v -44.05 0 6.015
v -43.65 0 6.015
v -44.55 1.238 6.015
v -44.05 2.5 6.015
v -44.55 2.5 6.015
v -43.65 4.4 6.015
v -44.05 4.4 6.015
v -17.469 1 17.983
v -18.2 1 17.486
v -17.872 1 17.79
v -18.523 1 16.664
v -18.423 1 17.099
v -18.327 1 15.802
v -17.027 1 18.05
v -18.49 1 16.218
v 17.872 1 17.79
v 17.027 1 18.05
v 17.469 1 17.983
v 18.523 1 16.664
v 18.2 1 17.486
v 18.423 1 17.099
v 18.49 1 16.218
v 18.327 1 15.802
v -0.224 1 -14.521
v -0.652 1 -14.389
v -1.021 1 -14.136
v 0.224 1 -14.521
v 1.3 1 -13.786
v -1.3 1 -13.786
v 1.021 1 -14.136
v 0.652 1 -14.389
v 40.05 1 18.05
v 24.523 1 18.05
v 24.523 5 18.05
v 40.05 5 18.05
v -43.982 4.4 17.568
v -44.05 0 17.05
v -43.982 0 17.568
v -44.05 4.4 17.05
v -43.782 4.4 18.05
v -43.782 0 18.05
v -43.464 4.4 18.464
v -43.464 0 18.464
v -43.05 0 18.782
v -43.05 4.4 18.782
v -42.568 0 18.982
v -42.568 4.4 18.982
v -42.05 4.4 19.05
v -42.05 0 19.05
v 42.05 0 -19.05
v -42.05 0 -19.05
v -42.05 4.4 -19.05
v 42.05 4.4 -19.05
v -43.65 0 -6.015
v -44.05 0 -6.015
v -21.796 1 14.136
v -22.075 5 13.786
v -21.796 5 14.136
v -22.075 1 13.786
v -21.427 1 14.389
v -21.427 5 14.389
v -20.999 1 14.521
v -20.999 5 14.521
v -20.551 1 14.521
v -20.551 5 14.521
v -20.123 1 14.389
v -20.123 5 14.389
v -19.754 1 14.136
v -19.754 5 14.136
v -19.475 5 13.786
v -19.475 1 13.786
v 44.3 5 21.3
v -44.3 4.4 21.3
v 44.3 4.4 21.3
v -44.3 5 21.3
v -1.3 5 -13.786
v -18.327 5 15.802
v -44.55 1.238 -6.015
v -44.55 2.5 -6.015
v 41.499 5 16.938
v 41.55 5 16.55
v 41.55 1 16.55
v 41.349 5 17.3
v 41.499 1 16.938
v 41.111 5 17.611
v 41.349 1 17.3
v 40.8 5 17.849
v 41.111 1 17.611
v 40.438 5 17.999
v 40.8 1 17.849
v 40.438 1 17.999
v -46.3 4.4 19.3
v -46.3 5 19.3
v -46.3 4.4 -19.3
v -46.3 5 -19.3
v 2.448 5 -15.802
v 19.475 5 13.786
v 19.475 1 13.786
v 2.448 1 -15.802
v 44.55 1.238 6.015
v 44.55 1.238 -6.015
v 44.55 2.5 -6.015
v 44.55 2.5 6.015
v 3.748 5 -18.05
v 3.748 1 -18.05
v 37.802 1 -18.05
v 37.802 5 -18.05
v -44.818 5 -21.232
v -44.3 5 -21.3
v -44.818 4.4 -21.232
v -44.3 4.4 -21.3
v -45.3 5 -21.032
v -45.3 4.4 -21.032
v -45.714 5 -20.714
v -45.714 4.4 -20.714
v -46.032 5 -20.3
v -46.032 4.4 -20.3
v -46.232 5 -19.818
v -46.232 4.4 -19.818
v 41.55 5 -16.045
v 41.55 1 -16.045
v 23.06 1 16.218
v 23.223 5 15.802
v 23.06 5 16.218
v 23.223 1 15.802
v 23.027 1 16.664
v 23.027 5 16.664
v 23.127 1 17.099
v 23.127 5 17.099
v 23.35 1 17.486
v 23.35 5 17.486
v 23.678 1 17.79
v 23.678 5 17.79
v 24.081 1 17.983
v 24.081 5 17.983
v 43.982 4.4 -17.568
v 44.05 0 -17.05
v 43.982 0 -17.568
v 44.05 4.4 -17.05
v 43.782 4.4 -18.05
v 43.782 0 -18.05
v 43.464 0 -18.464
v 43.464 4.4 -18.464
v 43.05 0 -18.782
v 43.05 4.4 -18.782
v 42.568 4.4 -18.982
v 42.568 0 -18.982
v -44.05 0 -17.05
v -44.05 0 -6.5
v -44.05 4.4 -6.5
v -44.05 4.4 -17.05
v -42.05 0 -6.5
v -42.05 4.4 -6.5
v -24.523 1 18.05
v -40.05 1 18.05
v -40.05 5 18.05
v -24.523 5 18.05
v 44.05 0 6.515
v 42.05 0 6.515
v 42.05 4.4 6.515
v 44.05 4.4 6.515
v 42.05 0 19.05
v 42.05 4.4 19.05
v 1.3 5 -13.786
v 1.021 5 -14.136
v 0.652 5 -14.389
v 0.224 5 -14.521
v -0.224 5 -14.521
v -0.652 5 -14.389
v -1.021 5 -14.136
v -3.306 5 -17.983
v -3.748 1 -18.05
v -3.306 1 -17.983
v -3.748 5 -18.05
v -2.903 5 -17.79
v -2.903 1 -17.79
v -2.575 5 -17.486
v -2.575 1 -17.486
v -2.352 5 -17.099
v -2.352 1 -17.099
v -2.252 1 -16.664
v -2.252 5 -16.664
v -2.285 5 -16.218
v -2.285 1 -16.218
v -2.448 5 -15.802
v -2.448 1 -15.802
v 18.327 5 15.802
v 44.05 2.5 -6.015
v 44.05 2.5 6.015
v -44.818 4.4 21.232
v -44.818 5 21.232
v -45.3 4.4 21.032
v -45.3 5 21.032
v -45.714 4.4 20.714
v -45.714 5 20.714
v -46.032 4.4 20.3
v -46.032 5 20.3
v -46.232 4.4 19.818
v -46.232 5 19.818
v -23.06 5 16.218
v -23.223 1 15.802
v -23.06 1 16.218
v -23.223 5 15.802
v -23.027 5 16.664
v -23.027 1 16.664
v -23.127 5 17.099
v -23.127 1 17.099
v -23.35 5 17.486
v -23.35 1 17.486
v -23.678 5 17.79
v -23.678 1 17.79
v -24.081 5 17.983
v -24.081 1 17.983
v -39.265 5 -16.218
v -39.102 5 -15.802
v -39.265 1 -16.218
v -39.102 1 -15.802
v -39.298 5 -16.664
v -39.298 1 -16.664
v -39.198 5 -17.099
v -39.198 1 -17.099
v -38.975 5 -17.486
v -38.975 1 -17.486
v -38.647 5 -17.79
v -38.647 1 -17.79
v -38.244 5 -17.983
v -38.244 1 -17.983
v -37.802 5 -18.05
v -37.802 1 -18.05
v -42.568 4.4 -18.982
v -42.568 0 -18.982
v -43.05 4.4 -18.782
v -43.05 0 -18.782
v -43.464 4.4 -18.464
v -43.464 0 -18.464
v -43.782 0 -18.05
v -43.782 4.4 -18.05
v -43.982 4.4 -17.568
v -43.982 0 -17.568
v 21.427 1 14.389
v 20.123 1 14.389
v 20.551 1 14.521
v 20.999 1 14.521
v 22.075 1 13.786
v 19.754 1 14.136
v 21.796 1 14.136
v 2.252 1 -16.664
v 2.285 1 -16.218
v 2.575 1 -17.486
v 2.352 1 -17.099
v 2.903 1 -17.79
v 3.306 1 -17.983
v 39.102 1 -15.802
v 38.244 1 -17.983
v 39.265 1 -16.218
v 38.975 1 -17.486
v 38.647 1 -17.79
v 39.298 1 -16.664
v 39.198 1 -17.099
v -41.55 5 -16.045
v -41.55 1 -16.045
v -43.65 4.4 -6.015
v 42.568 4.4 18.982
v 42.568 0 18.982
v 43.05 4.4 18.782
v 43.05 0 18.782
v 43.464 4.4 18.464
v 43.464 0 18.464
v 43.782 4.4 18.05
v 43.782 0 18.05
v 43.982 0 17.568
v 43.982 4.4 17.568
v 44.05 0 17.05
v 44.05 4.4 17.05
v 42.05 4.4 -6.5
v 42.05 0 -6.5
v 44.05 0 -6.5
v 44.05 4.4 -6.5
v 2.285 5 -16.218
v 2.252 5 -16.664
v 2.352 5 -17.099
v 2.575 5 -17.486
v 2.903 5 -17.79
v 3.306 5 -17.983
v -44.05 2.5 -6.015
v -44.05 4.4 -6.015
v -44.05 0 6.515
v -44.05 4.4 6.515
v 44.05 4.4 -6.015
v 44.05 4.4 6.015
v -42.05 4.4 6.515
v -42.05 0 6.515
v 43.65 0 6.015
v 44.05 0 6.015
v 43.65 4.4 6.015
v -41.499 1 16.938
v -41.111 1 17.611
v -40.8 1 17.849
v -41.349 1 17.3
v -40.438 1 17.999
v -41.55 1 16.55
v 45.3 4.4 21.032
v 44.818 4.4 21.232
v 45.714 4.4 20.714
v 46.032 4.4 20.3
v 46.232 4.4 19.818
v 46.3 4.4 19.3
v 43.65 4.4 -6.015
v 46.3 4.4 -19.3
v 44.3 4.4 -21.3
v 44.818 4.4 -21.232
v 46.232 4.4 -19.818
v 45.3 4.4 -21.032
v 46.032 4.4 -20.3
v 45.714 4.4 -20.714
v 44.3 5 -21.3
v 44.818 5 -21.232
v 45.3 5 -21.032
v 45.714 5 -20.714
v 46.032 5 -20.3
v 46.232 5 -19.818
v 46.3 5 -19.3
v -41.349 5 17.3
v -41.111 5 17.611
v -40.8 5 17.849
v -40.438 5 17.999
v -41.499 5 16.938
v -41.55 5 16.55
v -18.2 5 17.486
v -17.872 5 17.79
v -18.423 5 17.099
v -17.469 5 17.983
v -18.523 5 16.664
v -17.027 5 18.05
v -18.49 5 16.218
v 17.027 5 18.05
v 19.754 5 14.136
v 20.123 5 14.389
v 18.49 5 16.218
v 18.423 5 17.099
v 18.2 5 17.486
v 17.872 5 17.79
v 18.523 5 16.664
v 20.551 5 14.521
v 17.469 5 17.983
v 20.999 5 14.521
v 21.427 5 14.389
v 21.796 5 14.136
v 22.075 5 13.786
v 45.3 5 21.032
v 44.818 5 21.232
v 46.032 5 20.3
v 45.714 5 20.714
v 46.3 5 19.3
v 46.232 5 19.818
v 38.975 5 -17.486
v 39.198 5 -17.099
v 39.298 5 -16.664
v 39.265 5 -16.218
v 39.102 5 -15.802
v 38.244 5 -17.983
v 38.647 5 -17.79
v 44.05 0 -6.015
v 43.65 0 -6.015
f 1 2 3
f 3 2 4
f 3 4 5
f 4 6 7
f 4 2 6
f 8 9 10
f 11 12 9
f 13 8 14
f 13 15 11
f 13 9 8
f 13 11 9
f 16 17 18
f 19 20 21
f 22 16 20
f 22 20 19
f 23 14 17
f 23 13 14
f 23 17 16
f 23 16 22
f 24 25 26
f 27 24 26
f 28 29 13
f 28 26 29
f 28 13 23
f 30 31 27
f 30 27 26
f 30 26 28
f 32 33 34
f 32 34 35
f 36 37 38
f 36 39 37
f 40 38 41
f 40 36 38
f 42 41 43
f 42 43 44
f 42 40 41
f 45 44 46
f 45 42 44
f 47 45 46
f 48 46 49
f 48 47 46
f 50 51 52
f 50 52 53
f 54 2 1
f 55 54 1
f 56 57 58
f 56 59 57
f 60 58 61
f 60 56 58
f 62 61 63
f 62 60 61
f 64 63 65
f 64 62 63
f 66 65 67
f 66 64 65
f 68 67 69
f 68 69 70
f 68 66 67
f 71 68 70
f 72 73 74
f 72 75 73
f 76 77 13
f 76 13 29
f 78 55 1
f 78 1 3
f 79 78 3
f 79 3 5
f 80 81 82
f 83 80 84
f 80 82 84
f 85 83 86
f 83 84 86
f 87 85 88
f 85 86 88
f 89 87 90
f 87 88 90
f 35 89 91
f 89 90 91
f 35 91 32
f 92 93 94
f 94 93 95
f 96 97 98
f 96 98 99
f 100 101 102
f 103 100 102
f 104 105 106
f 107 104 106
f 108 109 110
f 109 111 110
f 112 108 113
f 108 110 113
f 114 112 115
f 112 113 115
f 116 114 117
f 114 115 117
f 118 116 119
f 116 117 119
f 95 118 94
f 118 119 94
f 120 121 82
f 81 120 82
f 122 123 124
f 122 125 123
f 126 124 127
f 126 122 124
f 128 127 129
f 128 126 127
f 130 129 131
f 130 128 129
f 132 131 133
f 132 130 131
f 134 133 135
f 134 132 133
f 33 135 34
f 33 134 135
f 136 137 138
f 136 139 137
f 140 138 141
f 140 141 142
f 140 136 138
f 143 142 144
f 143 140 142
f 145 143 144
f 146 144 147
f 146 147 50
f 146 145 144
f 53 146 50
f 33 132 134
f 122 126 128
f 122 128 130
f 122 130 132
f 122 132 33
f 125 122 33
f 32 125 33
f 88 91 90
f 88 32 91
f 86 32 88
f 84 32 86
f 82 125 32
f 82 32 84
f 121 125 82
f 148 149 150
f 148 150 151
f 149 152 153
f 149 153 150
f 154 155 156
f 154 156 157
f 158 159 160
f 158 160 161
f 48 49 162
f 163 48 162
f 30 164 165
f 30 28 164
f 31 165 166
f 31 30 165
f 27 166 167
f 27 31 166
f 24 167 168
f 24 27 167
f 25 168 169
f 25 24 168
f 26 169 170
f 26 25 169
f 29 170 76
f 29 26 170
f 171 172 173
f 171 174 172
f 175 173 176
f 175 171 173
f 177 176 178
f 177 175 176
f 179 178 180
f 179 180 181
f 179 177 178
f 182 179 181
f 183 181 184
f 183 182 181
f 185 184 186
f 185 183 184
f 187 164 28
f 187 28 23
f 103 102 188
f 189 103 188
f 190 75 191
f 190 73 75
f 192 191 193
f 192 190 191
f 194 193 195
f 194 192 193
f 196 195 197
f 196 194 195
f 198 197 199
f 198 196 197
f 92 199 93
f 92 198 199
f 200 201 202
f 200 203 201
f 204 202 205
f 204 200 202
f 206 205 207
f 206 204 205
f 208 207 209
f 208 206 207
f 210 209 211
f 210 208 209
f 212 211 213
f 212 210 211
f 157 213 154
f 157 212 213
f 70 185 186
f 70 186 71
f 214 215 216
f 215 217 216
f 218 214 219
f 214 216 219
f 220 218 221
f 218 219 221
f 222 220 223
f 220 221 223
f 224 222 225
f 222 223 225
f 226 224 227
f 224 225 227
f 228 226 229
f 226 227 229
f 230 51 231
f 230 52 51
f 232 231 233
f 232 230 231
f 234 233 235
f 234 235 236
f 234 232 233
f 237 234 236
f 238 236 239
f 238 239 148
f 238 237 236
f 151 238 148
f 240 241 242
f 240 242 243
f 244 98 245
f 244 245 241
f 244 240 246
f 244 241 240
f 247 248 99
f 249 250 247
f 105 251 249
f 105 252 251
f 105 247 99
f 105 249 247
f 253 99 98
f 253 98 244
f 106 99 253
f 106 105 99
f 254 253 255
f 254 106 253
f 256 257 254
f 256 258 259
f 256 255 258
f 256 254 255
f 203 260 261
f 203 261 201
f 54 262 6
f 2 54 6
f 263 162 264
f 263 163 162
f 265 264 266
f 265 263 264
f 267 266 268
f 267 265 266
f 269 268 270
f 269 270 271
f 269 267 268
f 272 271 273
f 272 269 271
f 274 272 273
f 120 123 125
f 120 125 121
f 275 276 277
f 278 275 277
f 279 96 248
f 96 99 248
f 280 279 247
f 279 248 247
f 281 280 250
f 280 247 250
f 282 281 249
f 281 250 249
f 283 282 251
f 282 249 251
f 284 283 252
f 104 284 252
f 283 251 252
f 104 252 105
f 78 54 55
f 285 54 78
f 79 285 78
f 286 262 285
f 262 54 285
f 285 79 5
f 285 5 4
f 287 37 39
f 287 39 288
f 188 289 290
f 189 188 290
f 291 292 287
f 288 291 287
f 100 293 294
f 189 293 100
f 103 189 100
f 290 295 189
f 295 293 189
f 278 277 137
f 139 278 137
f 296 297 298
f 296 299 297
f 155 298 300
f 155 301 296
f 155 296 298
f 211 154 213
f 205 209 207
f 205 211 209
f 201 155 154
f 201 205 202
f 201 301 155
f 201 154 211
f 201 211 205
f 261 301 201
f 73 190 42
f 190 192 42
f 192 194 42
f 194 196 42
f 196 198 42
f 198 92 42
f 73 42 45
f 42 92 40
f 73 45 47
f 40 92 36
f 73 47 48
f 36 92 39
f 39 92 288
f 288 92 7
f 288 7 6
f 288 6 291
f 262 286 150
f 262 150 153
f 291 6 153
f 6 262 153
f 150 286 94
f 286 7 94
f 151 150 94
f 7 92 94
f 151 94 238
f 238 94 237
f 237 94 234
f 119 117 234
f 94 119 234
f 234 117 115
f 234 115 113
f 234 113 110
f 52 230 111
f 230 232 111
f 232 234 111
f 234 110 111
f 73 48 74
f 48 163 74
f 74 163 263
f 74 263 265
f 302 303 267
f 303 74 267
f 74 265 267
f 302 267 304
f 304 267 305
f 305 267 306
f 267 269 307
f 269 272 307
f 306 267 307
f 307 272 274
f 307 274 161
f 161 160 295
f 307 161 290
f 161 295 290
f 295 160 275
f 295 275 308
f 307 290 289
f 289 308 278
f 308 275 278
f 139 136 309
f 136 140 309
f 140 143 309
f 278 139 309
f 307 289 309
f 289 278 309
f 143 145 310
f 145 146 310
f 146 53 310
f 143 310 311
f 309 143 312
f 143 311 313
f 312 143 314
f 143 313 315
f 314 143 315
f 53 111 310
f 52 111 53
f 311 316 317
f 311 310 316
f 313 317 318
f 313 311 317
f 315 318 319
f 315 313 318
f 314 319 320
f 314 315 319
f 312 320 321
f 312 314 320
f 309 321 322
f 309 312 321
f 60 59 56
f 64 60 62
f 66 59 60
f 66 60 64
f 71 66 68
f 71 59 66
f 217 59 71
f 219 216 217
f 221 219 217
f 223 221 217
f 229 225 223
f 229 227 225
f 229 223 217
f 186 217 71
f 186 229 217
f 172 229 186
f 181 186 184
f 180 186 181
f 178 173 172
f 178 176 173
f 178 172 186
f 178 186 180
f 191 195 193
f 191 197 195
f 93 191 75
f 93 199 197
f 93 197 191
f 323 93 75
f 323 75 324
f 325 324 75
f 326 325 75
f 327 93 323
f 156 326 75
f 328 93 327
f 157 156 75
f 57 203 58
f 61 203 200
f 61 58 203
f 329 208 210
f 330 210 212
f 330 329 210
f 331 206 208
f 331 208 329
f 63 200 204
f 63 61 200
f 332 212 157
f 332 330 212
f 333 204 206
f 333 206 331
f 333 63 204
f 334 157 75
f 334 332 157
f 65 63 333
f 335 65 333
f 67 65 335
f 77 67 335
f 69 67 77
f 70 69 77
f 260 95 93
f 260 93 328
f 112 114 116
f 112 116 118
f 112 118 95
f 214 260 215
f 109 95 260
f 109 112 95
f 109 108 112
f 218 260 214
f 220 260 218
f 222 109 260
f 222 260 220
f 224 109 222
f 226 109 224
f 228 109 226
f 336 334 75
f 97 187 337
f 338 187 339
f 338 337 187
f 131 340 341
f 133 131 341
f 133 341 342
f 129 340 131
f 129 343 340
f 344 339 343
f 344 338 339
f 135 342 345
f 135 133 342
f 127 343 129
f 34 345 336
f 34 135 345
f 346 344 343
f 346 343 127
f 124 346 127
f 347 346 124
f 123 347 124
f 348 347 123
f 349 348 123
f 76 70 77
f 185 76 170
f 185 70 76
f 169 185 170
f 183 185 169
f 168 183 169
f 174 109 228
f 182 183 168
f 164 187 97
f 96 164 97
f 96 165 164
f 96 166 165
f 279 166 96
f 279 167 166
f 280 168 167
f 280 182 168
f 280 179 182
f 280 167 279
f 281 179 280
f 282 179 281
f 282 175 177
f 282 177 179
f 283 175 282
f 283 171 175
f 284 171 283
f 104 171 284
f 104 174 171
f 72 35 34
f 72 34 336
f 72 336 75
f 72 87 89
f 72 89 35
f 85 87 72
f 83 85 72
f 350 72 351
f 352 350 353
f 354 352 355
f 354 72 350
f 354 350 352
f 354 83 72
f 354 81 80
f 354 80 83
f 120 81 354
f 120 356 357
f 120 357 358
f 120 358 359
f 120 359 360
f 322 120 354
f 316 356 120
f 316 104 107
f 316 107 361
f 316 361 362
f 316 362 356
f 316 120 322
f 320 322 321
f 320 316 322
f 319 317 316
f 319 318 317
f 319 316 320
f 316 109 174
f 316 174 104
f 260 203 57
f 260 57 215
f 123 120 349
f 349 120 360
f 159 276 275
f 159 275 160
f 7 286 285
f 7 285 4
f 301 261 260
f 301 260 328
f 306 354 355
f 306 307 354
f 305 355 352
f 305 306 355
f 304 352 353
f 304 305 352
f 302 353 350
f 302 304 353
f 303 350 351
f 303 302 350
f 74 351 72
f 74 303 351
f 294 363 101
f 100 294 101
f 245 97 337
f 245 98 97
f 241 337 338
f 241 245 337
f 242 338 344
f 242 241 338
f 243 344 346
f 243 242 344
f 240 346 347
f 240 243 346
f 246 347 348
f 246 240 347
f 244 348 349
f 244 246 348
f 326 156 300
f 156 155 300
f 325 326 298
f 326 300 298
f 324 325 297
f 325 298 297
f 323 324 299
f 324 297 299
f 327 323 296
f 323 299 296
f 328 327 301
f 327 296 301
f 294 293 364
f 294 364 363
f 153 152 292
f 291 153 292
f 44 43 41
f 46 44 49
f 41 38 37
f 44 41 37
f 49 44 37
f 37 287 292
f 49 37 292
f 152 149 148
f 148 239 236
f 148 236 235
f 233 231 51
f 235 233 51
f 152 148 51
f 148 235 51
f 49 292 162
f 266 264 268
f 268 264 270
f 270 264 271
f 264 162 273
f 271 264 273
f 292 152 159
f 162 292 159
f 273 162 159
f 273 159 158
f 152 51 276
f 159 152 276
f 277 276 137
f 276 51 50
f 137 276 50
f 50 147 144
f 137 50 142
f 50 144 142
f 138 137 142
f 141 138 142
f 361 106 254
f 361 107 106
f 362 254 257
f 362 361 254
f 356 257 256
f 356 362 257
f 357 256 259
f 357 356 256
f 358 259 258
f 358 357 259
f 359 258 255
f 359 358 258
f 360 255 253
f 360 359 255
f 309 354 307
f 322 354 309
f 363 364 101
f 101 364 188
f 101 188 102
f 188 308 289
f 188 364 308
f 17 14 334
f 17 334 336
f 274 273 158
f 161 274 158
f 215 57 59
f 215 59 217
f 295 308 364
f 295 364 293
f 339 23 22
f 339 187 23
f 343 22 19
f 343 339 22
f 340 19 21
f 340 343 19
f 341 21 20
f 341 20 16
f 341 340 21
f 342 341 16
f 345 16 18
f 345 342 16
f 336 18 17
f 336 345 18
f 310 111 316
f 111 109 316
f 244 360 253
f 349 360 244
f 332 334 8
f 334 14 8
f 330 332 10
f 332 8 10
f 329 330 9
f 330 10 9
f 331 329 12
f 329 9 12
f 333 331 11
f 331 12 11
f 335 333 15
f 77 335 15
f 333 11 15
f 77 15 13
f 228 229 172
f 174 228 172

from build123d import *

# Parameters (mm, degrees)
SKETCH1_W           = 88.1
SKETCH1_H           = 38.1
BOSS_EXTRUDE1_DEPTH = 5
SHELL1_T            = -1
SKETCH2_W           = 92.6
SKETCH2_H           = 42.6
SKETCH2_W_2         = 88.1
SKETCH2_H_2         = 38.1
BOSS_EXTRUDE2_DEPTH = 0.6
SKETCH5_W           = 2.5
SKETCH5_H           = 38.1
BOSS_EXTRUDE4_DEPTH = 5
SKETCH7_W           = 2
SKETCH7_H           = 13.01498231
CUT_EXTRUDE2_DEPTH  = 4.4
SKETCH8_W           = 0.4
SKETCH8_H           = 12.02996462
BOSS_EXTRUDE5_DEPTH = 4.4
BOSS_EXTRUDE6_DEPTH = 12.02996462
BOSS_EXTRUDE3_DEPTH = 4
SKETCH4_W           = 88.1
SKETCH4_H           = 100
CUT_EXTRUDE1_DEPTH  = 4.4
FILLET1_R           = 2
FILLET2_R           = 1.5


with BuildPart() as part:
    # Sketch1 → Boss-Extrude1 (new body)
    with BuildSketch(Plane(origin=(0, 0, 0), x_dir=(1, 0, 0), z_dir=(0, 1, 0))):
        Rectangle(SKETCH1_W, SKETCH1_H)
    extrude(amount=BOSS_EXTRUDE1_DEPTH)

    # Shell1
    shell1_openings = [part.faces().sort_by_distance(p)[0] for p in [
        (0, 5, 0),
    ]]
    offset(amount=SHELL1_T, openings=shell1_openings, kind=Kind.INTERSECTION)

    # Sketch2 → Boss-Extrude2 (add)
    with BuildSketch(Plane(origin=(0, 5, 0), x_dir=(1, 0, 0), z_dir=(0, 1, 0))):
        Rectangle(SKETCH2_W, SKETCH2_H)
        Rectangle(SKETCH2_W_2, SKETCH2_H_2, mode=Mode.SUBTRACT)
    extrude(amount=-BOSS_EXTRUDE2_DEPTH)

    # Sketch5 → Boss-Extrude4 (add)
    with BuildSketch(Plane.XZ):
        with Locations((42.8, 0)):
            Rectangle(SKETCH5_W, SKETCH5_H)
    boss_extrude4 = extrude(amount=-BOSS_EXTRUDE4_DEPTH)

    # Sketch7 → Cut-Extrude2 (cut)
    with BuildSketch(Plane.XZ):
        with Locations((43.05, 0.007491155)):
            Rectangle(SKETCH7_W, SKETCH7_H)
    cut_extrude2 = extrude(amount=-CUT_EXTRUDE2_DEPTH, mode=Mode.SUBTRACT)

    # Sketch8 → Boss-Extrude5 (add)
    with BuildSketch(Plane.XZ.offset(-4.4)):
        with Locations((43.85, 0)):
            Rectangle(SKETCH8_W, SKETCH8_H)
    boss_extrude5 = extrude(amount=BOSS_EXTRUDE5_DEPTH)

    # Sketch9 → Boss-Extrude6 (add)
    with BuildSketch(Plane(origin=(0, 0, -6.01498231), x_dir=(-1, 0, 0), z_dir=(0, 0, -1))):
        Polygon((-44.05, 0), (-44.55, 1.237543427), (-44.55, 2.5), (-44.05, 2.5), align=None)
    boss_extrude6 = extrude(amount=-BOSS_EXTRUDE6_DEPTH)

    # Mirror1: Boss-Extrude4, Cut-Extrude2, Boss-Extrude5, Boss-Extrude6 across plane
    add(boss_extrude4.mirror(Plane(origin=(0, 0, 0), x_dir=(0, 0, 1), z_dir=(1, 0, 0))))
    add(cut_extrude2.mirror(Plane(origin=(0, 0, 0), x_dir=(0, 0, 1), z_dir=(1, 0, 0))), mode=Mode.SUBTRACT)
    add(boss_extrude5.mirror(Plane(origin=(0, 0, 0), x_dir=(0, 0, 1), z_dir=(1, 0, 0))))
    add(boss_extrude6.mirror(Plane(origin=(0, 0, 0), x_dir=(0, 0, 1), z_dir=(1, 0, 0))))

    # Sketch3 → Boss-Extrude3 (add)
    with BuildSketch(Plane(origin=(0, 5, 0), x_dir=(1, 0, 0), z_dir=(0, 1, 0))):
        Polygon((-42.416724684, 17.551213149), (-20.775, -20.0548644), (0, 16.0451356), (20.775, -20.0548644), (42.416724684, 17.551213149), (40.683275316, 18.548786851), (20.775, -16.0451356), (0, 20.0548644), (-20.775, -16.0451356), (-40.683275316, 18.548786851), align=None)
    extrude(amount=-BOSS_EXTRUDE3_DEPTH)

    # Sketch4 → Cut-Extrude1 (cut)
    with BuildSketch(Plane.XZ):
        with Locations((0, 69.05)):
            Rectangle(SKETCH4_W, SKETCH4_H)
        with Locations((0, -69.05)):
            Rectangle(SKETCH4_W, SKETCH4_H)
    extrude(amount=-CUT_EXTRUDE1_DEPTH, mode=Mode.SUBTRACT)

    # Fillet1
    fillet1_edges = [part.edges().sort_by_distance(p)[0] for p in [
        (-44.05, 2.2, -19.05),
        (44.05, 2.2, -19.05),
        (44.05, 2.2, 19.05),
        (-44.05, 2.2, 19.05),
        (-46.3, 4.7, -21.3),
        (46.3, 4.7, -21.3),
        (46.3, 4.7, 21.3),
        (-46.3, 4.7, 21.3),
    ]]
    fillet(fillet1_edges, radius=FILLET1_R)

    # Fillet2
    fillet2_edges = [part.edges().sort_by_distance(p)[0] for p in [
        (-41.55, 3, 18.05),
        (-21.928768917, 3, 18.05),
        (-40.396231083, 3, -18.05),
        (-1.153768917, 3, -18.05),
        (-20.775, 3, 16.0451356),
        (1.153768917, 3, -18.05),
        (40.396231083, 3, -18.05),
        (20.775, 3, 16.0451356),
        (21.928768917, 3, 18.05),
        (19.621231083, 3, 18.05),
        (-19.621231083, 3, 18.05),
        (0, 3, -16.0451356),
        (41.55, 3, 18.05),
    ]]
    fillet(fillet2_edges, radius=FILLET2_R)


solid = part.part
